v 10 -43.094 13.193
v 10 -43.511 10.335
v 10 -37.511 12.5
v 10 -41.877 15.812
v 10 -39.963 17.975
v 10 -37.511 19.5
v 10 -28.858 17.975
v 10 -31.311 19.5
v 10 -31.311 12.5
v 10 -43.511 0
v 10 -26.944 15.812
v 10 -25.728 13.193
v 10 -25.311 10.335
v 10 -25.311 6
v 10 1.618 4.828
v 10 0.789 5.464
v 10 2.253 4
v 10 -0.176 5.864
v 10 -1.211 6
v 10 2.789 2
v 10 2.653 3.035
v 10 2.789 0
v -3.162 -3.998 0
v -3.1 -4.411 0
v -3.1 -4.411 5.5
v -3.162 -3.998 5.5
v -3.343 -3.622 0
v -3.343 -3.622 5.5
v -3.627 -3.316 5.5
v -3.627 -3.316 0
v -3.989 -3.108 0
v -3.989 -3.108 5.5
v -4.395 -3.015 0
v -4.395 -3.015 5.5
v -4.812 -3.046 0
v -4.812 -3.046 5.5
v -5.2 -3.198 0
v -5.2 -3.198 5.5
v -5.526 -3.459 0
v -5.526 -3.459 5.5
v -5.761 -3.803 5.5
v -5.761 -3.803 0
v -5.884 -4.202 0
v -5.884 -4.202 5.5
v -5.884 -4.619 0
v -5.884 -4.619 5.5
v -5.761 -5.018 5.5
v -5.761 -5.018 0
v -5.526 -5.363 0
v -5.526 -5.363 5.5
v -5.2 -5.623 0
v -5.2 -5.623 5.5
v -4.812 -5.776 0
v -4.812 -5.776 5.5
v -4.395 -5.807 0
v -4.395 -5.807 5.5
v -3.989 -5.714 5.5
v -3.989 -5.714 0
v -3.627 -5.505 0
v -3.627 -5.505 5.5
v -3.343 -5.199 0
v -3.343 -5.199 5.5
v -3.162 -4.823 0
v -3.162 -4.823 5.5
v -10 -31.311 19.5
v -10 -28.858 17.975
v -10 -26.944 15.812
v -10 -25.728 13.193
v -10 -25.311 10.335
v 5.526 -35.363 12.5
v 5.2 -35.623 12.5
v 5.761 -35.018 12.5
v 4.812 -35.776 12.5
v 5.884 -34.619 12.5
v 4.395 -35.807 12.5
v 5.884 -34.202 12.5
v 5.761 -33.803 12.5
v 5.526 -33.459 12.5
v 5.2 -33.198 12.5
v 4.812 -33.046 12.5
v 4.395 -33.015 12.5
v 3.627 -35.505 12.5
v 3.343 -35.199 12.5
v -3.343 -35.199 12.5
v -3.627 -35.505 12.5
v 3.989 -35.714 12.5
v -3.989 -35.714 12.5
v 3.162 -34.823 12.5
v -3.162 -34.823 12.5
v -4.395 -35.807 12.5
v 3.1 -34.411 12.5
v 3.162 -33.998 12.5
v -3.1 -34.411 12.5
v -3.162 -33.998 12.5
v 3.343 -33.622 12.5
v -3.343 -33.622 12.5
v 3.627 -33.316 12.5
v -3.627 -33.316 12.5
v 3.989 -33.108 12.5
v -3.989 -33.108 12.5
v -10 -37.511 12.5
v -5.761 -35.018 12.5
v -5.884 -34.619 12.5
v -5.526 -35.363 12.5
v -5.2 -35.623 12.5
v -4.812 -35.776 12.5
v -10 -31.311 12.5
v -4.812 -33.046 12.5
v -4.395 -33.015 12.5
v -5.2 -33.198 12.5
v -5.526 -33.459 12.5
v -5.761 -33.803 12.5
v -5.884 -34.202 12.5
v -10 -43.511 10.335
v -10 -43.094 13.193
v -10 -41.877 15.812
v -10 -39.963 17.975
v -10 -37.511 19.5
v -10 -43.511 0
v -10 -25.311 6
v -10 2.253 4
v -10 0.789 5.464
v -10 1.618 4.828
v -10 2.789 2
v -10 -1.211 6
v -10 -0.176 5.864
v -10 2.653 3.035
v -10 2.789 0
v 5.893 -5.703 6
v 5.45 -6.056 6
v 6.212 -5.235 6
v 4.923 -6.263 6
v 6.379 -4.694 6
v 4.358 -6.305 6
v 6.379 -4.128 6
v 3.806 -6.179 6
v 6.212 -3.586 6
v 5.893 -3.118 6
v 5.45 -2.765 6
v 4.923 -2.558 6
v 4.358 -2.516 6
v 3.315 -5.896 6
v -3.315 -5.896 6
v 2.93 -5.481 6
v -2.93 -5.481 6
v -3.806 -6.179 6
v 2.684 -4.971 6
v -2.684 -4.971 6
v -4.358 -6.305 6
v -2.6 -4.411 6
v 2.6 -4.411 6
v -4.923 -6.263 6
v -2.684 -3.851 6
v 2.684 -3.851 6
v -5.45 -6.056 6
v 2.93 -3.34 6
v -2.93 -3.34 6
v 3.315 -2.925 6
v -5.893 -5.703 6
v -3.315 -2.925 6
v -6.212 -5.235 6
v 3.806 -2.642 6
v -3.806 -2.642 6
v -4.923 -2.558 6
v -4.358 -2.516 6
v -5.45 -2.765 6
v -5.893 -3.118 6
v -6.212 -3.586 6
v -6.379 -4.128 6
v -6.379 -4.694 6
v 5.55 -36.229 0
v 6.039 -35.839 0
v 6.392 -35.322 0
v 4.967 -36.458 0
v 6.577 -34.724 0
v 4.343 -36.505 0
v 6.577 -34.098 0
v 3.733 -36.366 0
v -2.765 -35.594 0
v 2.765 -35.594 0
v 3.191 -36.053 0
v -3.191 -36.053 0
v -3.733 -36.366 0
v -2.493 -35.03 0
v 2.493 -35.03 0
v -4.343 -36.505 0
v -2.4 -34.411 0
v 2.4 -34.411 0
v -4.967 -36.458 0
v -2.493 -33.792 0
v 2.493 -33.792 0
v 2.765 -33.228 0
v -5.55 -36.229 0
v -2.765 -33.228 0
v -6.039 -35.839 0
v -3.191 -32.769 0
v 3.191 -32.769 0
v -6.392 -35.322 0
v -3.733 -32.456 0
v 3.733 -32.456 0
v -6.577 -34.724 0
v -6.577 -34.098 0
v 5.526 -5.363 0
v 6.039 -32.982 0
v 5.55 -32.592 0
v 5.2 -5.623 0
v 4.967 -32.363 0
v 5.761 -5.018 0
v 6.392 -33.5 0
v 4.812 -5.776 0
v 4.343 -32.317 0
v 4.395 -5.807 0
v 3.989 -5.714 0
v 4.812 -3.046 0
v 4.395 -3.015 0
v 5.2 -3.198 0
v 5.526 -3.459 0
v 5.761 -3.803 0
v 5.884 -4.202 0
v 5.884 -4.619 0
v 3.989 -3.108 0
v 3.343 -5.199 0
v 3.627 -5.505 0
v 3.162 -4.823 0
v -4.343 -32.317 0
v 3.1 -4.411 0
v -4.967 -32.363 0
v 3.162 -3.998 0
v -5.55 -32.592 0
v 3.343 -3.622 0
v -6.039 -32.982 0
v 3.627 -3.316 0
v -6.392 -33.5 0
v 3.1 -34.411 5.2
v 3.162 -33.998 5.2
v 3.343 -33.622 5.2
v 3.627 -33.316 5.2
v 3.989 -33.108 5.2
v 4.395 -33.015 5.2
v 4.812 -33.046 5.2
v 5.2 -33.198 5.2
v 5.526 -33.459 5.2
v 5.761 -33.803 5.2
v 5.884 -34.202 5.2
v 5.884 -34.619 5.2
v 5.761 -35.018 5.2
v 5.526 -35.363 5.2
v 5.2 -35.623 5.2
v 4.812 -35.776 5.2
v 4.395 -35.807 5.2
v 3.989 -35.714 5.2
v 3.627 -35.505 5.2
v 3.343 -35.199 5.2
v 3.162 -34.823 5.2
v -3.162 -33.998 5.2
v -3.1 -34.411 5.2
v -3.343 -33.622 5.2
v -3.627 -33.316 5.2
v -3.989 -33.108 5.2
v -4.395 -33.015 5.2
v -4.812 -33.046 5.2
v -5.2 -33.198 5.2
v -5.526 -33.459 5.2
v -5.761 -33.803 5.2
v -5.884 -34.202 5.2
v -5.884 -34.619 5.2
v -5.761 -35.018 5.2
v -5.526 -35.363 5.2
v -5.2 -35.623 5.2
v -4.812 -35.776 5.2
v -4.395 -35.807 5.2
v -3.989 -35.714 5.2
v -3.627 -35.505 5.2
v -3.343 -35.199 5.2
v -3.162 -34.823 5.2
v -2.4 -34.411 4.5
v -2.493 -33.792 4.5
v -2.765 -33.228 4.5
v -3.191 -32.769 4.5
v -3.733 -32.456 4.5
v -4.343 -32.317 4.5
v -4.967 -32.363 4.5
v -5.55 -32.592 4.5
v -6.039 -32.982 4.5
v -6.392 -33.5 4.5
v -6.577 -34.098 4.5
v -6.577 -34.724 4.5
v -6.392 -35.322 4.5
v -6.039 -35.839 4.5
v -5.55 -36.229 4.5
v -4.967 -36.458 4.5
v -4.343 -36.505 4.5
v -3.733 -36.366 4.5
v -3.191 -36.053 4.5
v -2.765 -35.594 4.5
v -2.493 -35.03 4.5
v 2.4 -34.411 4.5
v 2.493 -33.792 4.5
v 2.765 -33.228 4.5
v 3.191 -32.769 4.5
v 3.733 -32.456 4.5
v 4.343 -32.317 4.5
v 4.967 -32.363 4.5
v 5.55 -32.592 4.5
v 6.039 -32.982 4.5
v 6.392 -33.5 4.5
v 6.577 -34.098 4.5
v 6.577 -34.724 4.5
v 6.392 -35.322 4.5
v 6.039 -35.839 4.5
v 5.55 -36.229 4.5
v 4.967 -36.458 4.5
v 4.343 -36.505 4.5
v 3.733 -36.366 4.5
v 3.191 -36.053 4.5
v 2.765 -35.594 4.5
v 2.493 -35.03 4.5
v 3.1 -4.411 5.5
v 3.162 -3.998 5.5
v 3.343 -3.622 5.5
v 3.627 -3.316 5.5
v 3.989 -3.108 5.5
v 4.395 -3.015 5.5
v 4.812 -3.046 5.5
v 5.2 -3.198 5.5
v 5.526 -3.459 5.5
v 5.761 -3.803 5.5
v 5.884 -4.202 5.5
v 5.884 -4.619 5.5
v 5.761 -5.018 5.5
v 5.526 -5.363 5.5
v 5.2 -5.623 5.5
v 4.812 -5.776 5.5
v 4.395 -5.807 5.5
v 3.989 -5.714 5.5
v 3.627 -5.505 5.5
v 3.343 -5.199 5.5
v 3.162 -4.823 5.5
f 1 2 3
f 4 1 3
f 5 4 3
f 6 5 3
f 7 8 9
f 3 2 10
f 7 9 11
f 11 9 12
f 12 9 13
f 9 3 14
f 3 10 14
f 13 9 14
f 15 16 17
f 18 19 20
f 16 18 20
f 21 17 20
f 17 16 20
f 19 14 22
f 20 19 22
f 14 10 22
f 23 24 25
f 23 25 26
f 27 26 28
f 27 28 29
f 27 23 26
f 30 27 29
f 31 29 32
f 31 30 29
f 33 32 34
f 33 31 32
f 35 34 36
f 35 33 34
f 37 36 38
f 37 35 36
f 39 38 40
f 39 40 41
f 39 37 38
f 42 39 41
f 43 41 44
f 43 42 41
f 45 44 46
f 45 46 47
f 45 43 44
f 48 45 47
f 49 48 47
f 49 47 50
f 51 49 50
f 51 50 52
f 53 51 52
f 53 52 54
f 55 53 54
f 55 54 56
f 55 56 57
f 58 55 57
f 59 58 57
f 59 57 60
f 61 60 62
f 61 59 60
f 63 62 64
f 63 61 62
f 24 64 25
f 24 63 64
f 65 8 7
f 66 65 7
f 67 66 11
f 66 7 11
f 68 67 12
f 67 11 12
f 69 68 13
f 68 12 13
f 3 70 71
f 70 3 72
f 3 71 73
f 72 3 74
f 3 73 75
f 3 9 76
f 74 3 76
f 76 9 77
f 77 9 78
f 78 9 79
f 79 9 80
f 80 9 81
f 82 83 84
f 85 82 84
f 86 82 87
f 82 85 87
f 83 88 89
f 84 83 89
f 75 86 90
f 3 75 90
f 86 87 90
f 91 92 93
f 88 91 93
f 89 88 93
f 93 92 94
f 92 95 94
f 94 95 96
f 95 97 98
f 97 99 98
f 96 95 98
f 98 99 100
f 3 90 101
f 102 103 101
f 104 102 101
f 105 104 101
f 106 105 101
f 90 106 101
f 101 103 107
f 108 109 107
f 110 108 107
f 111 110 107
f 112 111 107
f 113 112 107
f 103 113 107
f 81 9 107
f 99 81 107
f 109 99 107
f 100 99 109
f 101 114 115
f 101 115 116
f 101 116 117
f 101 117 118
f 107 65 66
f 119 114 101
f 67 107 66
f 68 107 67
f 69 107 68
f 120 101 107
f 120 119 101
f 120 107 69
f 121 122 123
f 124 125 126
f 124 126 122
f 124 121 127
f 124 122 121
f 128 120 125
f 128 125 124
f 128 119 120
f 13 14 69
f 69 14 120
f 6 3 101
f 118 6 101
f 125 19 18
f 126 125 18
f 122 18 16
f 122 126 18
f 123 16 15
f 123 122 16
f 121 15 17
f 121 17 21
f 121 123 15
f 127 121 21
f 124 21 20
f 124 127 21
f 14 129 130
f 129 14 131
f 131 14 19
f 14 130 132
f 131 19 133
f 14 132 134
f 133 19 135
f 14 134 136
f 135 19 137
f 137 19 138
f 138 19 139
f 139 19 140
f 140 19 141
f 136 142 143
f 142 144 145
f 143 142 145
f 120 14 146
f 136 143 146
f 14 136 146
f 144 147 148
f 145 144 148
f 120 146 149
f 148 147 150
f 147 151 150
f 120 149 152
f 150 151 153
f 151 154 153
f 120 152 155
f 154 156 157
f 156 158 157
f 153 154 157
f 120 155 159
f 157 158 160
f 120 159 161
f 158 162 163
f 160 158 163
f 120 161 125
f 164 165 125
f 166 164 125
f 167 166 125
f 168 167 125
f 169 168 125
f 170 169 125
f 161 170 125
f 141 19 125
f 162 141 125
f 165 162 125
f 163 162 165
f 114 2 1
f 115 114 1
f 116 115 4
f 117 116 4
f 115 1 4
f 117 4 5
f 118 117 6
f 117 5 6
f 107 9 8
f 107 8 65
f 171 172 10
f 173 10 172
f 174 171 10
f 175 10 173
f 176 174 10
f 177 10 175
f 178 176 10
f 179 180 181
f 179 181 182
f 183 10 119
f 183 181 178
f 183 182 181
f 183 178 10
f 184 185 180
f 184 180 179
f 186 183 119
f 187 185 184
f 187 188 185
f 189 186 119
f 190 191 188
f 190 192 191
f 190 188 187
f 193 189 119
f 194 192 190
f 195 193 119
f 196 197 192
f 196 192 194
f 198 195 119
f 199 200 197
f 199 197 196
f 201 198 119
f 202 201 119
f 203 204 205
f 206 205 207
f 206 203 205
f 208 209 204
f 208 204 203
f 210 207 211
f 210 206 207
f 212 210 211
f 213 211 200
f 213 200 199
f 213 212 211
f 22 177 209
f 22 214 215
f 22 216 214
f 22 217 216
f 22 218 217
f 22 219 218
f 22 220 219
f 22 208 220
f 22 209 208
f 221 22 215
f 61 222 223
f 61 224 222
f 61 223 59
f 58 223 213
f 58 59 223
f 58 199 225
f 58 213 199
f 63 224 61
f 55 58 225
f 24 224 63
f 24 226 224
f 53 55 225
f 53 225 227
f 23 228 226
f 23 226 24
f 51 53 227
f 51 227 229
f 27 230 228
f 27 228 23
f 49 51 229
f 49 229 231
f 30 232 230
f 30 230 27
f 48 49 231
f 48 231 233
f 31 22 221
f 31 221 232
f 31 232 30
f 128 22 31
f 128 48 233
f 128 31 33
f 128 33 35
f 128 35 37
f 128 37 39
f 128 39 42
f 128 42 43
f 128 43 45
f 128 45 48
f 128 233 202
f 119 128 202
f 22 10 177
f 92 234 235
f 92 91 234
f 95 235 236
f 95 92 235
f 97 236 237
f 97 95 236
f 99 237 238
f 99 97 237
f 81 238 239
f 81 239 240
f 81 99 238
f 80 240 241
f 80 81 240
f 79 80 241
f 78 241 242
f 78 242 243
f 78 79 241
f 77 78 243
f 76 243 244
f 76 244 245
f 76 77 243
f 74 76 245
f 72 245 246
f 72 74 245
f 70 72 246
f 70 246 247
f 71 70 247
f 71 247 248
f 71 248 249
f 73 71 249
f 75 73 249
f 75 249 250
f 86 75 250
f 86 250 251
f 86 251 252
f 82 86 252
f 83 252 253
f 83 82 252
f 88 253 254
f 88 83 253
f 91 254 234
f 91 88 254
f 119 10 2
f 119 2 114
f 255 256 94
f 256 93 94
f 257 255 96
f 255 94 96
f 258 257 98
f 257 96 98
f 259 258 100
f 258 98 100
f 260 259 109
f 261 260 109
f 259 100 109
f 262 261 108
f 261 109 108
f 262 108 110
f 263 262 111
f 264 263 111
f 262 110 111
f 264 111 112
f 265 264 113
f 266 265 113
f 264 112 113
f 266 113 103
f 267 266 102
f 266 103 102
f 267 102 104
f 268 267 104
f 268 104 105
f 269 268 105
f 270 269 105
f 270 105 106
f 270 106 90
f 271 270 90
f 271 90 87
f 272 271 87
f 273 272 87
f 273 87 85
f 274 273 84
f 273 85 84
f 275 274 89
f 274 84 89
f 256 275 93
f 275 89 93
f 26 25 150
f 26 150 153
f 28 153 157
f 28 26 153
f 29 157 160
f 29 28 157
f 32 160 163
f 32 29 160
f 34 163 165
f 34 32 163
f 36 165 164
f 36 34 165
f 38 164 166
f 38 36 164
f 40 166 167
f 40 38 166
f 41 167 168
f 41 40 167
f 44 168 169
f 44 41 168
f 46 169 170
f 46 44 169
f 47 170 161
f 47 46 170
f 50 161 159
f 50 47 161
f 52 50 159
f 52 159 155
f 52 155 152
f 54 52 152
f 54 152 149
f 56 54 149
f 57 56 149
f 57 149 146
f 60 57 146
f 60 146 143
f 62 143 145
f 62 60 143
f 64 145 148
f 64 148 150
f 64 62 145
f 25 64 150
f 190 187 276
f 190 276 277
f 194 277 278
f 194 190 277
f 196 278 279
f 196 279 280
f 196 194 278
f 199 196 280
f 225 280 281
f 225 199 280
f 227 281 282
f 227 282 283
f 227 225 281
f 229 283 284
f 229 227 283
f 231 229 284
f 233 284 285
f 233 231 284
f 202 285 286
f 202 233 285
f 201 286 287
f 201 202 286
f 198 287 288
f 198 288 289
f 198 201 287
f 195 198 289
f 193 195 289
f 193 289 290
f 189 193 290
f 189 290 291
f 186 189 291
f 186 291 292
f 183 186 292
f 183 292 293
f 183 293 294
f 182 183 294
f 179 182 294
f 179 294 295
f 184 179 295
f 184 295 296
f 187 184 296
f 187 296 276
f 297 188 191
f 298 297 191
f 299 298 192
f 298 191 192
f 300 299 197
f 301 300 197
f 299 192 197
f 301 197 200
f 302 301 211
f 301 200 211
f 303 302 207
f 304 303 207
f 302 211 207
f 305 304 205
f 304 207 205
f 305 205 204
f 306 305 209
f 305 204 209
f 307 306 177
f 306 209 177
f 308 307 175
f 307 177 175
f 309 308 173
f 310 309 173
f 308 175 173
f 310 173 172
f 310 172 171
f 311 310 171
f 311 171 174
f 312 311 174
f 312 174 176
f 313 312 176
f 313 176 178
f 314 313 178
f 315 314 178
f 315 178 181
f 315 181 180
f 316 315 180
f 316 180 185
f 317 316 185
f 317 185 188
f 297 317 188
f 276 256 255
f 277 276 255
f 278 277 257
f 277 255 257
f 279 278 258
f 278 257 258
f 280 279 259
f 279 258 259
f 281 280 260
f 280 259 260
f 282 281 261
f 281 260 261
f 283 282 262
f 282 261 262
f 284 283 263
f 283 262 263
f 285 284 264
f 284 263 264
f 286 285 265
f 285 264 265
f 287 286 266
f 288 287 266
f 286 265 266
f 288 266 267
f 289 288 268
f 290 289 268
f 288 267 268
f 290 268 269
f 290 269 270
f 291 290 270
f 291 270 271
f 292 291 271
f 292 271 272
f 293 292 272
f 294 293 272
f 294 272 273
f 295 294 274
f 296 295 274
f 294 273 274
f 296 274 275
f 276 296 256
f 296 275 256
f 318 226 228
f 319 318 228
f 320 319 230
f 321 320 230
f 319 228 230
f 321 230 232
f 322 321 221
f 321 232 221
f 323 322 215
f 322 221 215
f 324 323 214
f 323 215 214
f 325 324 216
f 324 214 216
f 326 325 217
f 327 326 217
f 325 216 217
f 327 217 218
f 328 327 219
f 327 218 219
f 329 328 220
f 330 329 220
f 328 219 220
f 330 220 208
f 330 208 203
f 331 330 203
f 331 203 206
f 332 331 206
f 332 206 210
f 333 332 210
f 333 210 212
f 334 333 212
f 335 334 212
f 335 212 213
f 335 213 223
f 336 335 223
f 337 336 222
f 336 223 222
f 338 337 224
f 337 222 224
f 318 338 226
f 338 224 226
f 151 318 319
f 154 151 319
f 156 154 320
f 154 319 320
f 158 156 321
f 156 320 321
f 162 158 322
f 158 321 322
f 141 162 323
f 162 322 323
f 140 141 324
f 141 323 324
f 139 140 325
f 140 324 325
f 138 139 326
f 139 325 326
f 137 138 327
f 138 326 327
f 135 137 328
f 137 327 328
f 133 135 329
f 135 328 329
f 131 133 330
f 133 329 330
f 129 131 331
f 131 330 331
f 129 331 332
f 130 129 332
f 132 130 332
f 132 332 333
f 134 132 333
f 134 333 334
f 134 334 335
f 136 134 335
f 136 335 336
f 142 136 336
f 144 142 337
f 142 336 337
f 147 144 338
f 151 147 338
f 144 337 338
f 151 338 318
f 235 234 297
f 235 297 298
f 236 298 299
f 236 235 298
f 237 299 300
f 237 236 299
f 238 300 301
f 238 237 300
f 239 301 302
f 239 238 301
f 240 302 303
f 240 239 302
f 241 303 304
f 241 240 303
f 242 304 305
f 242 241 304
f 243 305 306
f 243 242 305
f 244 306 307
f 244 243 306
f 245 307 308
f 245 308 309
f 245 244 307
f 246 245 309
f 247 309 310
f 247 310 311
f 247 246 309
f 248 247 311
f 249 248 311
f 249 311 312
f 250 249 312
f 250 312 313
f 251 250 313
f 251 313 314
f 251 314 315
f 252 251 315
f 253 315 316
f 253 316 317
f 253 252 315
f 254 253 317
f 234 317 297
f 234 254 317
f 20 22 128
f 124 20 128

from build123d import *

# Parameters (mm, degrees)
F0_W        = 10
F0_H        = 28.1
F0_R        = 1.4
F1_DEPTH    = 6
F0_H_2      = 6
F2_DEPTH    = 19.5
F0_H_3      = 6.2
F0_R_2      = 2.1
F3_DEPTH    = 12.5
F4_DEPTH    = 19.5
F5_DEPTH    = 12.5
F6_DEPTH    = 6.5
F7_T1_DEPTH = 55.8257569496
F8_S5_R     = 1.4
F8_T6_DEPTH = 5
F9_R        = 4
F10_SIZE    = 0.5


# Not quite as in the source:
# - a fillet or chamfer that OpenCascade refuses, or shapes differently, is made with other operations: its cross-section is extruded or revolved along the edge and cut away or added


with BuildPart() as f1:
    # F0 (on Top) → F1 (new body)
    with BuildSketch(Plane.XY):
        with Locations((-5, -11.2607904853)):
            Rectangle(F0_W, F0_H)
        with Locations((-4.5, -4.4107904853)):
            Circle(F0_R, mode=Mode.SUBTRACT)
    extrude(amount=F1_DEPTH)

    # F0 (on Top) → F2 (join)
    with BuildSketch(Plane.XY):
        with Locations((-5, -28.3107904853)):
            Rectangle(F0_W, F0_H_2)
    extrude(amount=F2_DEPTH)

    # F0 (on Top) → F3 (join)
    with BuildSketch(Plane.XY):
        with Locations((-5, -34.4107904853)):
            Rectangle(F0_W, F0_H_3)
        with Locations((-4.5, -34.4107904853)):
            Circle(F0_R_2, mode=Mode.SUBTRACT)
    extrude(amount=F3_DEPTH)

    # F0 (on Top) → F4 (join)
    with BuildSketch(Plane.XY):
        with Locations((-5, -40.5107904853)):
            Rectangle(F0_W, F0_H_2)
    extrude(amount=F4_DEPTH)

    # F0 (on Top) → F5 (join)
    with BuildSketch(Plane.XY):
        with Locations((-4.5, -34.4107904853)):
            Circle(F0_R_2)
        with Locations((-4.5, -34.4107904853)):
            Circle(F0_R, mode=Mode.SUBTRACT)
    extrude(amount=F5_DEPTH)

    # F0 (on Top) → F6 (cut)
    with BuildSketch(Plane.XY):
        with Locations((-4.5, -34.4107904853)):
            Circle(F0_R_2)
        with Locations((-4.5, -34.4107904853)):
            Circle(F0_R, mode=Mode.SUBTRACT)
    extrude(amount=F6_DEPTH, mode=Mode.SUBTRACT)

    # F7: fillet of radius 10 on 2 edges, made by hand

    # F7_s2 → F7_t1 (cut)
    with BuildSketch(Plane.YZ.offset(-32.9128784748)):
        with BuildLine():
            ThreePointArc((-31.3107904853, 19.5), (-26.9441902199, 15.8120741851), (-25.3107904853, 10.3348486101))
            Line((-25.3107904853, 10.3348486101), (-25.3107904853, 19.5))
            Line((-25.3107904853, 19.5), (-31.3107904853, 19.5))
        make_face()
        with BuildLine():
            ThreePointArc((-43.5107904853, 10.3348486101), (-41.8773907506, 15.8120741851), (-37.5107904853, 19.5))
            Line((-37.5107904853, 19.5), (-43.5107904853, 19.5))
            Line((-43.5107904853, 19.5), (-43.5107904853, 10.3348486101))
        make_face()
    extrude(amount=F7_T1_DEPTH, mode=Mode.SUBTRACT)

    # F8: chamfer of 2 on 1 edges, made by hand


with BuildPart() as f8_tool2:
    # F8_s3 → F8_t4 (revolve)
    with BuildSketch(Plane.XZ.offset(34.4107904853)):
        Polygon((-2.4, 4.5), (-4.4, 6.5), (-2.4, 6.5), align=None)
    revolve(axis=Axis((-4.5, -34.4107904853, 6.5), (0, 0, 1)))

    # F8_s5 → F8_t6 (cut, symmetric)
    with BuildSketch(Plane.XY.offset(5.5)):
        with Locations((-4.5, -34.4107904853)):
            Circle(F8_S5_R)
    extrude(amount=F8_T6_DEPTH, both=True, mode=Mode.SUBTRACT)


with BuildPart() as f1_1:
    add(f1.part)

    # F8_t1: union F8_tool2
    add(f8_tool2.part)

    # F9
    f9_edges = [f1_1.edges().sort_by_distance(p)[0] for p in [
        (-5, 2.78921, 6),
    ]]
    fillet(f9_edges, radius=F9_R)

    # F10
    f10_edges = [f1_1.edges().sort_by_distance(p)[0] for p in [
        (-5.9, -4.41079, 6),
    ]]
    chamfer(f10_edges, length=F10_SIZE)

    # F11: F1 across plane


with BuildPart() as f1_2:
    add(f1_1.part)
    add(f1_1.part.mirror(Plane.YZ))


solid = f1_2.part
